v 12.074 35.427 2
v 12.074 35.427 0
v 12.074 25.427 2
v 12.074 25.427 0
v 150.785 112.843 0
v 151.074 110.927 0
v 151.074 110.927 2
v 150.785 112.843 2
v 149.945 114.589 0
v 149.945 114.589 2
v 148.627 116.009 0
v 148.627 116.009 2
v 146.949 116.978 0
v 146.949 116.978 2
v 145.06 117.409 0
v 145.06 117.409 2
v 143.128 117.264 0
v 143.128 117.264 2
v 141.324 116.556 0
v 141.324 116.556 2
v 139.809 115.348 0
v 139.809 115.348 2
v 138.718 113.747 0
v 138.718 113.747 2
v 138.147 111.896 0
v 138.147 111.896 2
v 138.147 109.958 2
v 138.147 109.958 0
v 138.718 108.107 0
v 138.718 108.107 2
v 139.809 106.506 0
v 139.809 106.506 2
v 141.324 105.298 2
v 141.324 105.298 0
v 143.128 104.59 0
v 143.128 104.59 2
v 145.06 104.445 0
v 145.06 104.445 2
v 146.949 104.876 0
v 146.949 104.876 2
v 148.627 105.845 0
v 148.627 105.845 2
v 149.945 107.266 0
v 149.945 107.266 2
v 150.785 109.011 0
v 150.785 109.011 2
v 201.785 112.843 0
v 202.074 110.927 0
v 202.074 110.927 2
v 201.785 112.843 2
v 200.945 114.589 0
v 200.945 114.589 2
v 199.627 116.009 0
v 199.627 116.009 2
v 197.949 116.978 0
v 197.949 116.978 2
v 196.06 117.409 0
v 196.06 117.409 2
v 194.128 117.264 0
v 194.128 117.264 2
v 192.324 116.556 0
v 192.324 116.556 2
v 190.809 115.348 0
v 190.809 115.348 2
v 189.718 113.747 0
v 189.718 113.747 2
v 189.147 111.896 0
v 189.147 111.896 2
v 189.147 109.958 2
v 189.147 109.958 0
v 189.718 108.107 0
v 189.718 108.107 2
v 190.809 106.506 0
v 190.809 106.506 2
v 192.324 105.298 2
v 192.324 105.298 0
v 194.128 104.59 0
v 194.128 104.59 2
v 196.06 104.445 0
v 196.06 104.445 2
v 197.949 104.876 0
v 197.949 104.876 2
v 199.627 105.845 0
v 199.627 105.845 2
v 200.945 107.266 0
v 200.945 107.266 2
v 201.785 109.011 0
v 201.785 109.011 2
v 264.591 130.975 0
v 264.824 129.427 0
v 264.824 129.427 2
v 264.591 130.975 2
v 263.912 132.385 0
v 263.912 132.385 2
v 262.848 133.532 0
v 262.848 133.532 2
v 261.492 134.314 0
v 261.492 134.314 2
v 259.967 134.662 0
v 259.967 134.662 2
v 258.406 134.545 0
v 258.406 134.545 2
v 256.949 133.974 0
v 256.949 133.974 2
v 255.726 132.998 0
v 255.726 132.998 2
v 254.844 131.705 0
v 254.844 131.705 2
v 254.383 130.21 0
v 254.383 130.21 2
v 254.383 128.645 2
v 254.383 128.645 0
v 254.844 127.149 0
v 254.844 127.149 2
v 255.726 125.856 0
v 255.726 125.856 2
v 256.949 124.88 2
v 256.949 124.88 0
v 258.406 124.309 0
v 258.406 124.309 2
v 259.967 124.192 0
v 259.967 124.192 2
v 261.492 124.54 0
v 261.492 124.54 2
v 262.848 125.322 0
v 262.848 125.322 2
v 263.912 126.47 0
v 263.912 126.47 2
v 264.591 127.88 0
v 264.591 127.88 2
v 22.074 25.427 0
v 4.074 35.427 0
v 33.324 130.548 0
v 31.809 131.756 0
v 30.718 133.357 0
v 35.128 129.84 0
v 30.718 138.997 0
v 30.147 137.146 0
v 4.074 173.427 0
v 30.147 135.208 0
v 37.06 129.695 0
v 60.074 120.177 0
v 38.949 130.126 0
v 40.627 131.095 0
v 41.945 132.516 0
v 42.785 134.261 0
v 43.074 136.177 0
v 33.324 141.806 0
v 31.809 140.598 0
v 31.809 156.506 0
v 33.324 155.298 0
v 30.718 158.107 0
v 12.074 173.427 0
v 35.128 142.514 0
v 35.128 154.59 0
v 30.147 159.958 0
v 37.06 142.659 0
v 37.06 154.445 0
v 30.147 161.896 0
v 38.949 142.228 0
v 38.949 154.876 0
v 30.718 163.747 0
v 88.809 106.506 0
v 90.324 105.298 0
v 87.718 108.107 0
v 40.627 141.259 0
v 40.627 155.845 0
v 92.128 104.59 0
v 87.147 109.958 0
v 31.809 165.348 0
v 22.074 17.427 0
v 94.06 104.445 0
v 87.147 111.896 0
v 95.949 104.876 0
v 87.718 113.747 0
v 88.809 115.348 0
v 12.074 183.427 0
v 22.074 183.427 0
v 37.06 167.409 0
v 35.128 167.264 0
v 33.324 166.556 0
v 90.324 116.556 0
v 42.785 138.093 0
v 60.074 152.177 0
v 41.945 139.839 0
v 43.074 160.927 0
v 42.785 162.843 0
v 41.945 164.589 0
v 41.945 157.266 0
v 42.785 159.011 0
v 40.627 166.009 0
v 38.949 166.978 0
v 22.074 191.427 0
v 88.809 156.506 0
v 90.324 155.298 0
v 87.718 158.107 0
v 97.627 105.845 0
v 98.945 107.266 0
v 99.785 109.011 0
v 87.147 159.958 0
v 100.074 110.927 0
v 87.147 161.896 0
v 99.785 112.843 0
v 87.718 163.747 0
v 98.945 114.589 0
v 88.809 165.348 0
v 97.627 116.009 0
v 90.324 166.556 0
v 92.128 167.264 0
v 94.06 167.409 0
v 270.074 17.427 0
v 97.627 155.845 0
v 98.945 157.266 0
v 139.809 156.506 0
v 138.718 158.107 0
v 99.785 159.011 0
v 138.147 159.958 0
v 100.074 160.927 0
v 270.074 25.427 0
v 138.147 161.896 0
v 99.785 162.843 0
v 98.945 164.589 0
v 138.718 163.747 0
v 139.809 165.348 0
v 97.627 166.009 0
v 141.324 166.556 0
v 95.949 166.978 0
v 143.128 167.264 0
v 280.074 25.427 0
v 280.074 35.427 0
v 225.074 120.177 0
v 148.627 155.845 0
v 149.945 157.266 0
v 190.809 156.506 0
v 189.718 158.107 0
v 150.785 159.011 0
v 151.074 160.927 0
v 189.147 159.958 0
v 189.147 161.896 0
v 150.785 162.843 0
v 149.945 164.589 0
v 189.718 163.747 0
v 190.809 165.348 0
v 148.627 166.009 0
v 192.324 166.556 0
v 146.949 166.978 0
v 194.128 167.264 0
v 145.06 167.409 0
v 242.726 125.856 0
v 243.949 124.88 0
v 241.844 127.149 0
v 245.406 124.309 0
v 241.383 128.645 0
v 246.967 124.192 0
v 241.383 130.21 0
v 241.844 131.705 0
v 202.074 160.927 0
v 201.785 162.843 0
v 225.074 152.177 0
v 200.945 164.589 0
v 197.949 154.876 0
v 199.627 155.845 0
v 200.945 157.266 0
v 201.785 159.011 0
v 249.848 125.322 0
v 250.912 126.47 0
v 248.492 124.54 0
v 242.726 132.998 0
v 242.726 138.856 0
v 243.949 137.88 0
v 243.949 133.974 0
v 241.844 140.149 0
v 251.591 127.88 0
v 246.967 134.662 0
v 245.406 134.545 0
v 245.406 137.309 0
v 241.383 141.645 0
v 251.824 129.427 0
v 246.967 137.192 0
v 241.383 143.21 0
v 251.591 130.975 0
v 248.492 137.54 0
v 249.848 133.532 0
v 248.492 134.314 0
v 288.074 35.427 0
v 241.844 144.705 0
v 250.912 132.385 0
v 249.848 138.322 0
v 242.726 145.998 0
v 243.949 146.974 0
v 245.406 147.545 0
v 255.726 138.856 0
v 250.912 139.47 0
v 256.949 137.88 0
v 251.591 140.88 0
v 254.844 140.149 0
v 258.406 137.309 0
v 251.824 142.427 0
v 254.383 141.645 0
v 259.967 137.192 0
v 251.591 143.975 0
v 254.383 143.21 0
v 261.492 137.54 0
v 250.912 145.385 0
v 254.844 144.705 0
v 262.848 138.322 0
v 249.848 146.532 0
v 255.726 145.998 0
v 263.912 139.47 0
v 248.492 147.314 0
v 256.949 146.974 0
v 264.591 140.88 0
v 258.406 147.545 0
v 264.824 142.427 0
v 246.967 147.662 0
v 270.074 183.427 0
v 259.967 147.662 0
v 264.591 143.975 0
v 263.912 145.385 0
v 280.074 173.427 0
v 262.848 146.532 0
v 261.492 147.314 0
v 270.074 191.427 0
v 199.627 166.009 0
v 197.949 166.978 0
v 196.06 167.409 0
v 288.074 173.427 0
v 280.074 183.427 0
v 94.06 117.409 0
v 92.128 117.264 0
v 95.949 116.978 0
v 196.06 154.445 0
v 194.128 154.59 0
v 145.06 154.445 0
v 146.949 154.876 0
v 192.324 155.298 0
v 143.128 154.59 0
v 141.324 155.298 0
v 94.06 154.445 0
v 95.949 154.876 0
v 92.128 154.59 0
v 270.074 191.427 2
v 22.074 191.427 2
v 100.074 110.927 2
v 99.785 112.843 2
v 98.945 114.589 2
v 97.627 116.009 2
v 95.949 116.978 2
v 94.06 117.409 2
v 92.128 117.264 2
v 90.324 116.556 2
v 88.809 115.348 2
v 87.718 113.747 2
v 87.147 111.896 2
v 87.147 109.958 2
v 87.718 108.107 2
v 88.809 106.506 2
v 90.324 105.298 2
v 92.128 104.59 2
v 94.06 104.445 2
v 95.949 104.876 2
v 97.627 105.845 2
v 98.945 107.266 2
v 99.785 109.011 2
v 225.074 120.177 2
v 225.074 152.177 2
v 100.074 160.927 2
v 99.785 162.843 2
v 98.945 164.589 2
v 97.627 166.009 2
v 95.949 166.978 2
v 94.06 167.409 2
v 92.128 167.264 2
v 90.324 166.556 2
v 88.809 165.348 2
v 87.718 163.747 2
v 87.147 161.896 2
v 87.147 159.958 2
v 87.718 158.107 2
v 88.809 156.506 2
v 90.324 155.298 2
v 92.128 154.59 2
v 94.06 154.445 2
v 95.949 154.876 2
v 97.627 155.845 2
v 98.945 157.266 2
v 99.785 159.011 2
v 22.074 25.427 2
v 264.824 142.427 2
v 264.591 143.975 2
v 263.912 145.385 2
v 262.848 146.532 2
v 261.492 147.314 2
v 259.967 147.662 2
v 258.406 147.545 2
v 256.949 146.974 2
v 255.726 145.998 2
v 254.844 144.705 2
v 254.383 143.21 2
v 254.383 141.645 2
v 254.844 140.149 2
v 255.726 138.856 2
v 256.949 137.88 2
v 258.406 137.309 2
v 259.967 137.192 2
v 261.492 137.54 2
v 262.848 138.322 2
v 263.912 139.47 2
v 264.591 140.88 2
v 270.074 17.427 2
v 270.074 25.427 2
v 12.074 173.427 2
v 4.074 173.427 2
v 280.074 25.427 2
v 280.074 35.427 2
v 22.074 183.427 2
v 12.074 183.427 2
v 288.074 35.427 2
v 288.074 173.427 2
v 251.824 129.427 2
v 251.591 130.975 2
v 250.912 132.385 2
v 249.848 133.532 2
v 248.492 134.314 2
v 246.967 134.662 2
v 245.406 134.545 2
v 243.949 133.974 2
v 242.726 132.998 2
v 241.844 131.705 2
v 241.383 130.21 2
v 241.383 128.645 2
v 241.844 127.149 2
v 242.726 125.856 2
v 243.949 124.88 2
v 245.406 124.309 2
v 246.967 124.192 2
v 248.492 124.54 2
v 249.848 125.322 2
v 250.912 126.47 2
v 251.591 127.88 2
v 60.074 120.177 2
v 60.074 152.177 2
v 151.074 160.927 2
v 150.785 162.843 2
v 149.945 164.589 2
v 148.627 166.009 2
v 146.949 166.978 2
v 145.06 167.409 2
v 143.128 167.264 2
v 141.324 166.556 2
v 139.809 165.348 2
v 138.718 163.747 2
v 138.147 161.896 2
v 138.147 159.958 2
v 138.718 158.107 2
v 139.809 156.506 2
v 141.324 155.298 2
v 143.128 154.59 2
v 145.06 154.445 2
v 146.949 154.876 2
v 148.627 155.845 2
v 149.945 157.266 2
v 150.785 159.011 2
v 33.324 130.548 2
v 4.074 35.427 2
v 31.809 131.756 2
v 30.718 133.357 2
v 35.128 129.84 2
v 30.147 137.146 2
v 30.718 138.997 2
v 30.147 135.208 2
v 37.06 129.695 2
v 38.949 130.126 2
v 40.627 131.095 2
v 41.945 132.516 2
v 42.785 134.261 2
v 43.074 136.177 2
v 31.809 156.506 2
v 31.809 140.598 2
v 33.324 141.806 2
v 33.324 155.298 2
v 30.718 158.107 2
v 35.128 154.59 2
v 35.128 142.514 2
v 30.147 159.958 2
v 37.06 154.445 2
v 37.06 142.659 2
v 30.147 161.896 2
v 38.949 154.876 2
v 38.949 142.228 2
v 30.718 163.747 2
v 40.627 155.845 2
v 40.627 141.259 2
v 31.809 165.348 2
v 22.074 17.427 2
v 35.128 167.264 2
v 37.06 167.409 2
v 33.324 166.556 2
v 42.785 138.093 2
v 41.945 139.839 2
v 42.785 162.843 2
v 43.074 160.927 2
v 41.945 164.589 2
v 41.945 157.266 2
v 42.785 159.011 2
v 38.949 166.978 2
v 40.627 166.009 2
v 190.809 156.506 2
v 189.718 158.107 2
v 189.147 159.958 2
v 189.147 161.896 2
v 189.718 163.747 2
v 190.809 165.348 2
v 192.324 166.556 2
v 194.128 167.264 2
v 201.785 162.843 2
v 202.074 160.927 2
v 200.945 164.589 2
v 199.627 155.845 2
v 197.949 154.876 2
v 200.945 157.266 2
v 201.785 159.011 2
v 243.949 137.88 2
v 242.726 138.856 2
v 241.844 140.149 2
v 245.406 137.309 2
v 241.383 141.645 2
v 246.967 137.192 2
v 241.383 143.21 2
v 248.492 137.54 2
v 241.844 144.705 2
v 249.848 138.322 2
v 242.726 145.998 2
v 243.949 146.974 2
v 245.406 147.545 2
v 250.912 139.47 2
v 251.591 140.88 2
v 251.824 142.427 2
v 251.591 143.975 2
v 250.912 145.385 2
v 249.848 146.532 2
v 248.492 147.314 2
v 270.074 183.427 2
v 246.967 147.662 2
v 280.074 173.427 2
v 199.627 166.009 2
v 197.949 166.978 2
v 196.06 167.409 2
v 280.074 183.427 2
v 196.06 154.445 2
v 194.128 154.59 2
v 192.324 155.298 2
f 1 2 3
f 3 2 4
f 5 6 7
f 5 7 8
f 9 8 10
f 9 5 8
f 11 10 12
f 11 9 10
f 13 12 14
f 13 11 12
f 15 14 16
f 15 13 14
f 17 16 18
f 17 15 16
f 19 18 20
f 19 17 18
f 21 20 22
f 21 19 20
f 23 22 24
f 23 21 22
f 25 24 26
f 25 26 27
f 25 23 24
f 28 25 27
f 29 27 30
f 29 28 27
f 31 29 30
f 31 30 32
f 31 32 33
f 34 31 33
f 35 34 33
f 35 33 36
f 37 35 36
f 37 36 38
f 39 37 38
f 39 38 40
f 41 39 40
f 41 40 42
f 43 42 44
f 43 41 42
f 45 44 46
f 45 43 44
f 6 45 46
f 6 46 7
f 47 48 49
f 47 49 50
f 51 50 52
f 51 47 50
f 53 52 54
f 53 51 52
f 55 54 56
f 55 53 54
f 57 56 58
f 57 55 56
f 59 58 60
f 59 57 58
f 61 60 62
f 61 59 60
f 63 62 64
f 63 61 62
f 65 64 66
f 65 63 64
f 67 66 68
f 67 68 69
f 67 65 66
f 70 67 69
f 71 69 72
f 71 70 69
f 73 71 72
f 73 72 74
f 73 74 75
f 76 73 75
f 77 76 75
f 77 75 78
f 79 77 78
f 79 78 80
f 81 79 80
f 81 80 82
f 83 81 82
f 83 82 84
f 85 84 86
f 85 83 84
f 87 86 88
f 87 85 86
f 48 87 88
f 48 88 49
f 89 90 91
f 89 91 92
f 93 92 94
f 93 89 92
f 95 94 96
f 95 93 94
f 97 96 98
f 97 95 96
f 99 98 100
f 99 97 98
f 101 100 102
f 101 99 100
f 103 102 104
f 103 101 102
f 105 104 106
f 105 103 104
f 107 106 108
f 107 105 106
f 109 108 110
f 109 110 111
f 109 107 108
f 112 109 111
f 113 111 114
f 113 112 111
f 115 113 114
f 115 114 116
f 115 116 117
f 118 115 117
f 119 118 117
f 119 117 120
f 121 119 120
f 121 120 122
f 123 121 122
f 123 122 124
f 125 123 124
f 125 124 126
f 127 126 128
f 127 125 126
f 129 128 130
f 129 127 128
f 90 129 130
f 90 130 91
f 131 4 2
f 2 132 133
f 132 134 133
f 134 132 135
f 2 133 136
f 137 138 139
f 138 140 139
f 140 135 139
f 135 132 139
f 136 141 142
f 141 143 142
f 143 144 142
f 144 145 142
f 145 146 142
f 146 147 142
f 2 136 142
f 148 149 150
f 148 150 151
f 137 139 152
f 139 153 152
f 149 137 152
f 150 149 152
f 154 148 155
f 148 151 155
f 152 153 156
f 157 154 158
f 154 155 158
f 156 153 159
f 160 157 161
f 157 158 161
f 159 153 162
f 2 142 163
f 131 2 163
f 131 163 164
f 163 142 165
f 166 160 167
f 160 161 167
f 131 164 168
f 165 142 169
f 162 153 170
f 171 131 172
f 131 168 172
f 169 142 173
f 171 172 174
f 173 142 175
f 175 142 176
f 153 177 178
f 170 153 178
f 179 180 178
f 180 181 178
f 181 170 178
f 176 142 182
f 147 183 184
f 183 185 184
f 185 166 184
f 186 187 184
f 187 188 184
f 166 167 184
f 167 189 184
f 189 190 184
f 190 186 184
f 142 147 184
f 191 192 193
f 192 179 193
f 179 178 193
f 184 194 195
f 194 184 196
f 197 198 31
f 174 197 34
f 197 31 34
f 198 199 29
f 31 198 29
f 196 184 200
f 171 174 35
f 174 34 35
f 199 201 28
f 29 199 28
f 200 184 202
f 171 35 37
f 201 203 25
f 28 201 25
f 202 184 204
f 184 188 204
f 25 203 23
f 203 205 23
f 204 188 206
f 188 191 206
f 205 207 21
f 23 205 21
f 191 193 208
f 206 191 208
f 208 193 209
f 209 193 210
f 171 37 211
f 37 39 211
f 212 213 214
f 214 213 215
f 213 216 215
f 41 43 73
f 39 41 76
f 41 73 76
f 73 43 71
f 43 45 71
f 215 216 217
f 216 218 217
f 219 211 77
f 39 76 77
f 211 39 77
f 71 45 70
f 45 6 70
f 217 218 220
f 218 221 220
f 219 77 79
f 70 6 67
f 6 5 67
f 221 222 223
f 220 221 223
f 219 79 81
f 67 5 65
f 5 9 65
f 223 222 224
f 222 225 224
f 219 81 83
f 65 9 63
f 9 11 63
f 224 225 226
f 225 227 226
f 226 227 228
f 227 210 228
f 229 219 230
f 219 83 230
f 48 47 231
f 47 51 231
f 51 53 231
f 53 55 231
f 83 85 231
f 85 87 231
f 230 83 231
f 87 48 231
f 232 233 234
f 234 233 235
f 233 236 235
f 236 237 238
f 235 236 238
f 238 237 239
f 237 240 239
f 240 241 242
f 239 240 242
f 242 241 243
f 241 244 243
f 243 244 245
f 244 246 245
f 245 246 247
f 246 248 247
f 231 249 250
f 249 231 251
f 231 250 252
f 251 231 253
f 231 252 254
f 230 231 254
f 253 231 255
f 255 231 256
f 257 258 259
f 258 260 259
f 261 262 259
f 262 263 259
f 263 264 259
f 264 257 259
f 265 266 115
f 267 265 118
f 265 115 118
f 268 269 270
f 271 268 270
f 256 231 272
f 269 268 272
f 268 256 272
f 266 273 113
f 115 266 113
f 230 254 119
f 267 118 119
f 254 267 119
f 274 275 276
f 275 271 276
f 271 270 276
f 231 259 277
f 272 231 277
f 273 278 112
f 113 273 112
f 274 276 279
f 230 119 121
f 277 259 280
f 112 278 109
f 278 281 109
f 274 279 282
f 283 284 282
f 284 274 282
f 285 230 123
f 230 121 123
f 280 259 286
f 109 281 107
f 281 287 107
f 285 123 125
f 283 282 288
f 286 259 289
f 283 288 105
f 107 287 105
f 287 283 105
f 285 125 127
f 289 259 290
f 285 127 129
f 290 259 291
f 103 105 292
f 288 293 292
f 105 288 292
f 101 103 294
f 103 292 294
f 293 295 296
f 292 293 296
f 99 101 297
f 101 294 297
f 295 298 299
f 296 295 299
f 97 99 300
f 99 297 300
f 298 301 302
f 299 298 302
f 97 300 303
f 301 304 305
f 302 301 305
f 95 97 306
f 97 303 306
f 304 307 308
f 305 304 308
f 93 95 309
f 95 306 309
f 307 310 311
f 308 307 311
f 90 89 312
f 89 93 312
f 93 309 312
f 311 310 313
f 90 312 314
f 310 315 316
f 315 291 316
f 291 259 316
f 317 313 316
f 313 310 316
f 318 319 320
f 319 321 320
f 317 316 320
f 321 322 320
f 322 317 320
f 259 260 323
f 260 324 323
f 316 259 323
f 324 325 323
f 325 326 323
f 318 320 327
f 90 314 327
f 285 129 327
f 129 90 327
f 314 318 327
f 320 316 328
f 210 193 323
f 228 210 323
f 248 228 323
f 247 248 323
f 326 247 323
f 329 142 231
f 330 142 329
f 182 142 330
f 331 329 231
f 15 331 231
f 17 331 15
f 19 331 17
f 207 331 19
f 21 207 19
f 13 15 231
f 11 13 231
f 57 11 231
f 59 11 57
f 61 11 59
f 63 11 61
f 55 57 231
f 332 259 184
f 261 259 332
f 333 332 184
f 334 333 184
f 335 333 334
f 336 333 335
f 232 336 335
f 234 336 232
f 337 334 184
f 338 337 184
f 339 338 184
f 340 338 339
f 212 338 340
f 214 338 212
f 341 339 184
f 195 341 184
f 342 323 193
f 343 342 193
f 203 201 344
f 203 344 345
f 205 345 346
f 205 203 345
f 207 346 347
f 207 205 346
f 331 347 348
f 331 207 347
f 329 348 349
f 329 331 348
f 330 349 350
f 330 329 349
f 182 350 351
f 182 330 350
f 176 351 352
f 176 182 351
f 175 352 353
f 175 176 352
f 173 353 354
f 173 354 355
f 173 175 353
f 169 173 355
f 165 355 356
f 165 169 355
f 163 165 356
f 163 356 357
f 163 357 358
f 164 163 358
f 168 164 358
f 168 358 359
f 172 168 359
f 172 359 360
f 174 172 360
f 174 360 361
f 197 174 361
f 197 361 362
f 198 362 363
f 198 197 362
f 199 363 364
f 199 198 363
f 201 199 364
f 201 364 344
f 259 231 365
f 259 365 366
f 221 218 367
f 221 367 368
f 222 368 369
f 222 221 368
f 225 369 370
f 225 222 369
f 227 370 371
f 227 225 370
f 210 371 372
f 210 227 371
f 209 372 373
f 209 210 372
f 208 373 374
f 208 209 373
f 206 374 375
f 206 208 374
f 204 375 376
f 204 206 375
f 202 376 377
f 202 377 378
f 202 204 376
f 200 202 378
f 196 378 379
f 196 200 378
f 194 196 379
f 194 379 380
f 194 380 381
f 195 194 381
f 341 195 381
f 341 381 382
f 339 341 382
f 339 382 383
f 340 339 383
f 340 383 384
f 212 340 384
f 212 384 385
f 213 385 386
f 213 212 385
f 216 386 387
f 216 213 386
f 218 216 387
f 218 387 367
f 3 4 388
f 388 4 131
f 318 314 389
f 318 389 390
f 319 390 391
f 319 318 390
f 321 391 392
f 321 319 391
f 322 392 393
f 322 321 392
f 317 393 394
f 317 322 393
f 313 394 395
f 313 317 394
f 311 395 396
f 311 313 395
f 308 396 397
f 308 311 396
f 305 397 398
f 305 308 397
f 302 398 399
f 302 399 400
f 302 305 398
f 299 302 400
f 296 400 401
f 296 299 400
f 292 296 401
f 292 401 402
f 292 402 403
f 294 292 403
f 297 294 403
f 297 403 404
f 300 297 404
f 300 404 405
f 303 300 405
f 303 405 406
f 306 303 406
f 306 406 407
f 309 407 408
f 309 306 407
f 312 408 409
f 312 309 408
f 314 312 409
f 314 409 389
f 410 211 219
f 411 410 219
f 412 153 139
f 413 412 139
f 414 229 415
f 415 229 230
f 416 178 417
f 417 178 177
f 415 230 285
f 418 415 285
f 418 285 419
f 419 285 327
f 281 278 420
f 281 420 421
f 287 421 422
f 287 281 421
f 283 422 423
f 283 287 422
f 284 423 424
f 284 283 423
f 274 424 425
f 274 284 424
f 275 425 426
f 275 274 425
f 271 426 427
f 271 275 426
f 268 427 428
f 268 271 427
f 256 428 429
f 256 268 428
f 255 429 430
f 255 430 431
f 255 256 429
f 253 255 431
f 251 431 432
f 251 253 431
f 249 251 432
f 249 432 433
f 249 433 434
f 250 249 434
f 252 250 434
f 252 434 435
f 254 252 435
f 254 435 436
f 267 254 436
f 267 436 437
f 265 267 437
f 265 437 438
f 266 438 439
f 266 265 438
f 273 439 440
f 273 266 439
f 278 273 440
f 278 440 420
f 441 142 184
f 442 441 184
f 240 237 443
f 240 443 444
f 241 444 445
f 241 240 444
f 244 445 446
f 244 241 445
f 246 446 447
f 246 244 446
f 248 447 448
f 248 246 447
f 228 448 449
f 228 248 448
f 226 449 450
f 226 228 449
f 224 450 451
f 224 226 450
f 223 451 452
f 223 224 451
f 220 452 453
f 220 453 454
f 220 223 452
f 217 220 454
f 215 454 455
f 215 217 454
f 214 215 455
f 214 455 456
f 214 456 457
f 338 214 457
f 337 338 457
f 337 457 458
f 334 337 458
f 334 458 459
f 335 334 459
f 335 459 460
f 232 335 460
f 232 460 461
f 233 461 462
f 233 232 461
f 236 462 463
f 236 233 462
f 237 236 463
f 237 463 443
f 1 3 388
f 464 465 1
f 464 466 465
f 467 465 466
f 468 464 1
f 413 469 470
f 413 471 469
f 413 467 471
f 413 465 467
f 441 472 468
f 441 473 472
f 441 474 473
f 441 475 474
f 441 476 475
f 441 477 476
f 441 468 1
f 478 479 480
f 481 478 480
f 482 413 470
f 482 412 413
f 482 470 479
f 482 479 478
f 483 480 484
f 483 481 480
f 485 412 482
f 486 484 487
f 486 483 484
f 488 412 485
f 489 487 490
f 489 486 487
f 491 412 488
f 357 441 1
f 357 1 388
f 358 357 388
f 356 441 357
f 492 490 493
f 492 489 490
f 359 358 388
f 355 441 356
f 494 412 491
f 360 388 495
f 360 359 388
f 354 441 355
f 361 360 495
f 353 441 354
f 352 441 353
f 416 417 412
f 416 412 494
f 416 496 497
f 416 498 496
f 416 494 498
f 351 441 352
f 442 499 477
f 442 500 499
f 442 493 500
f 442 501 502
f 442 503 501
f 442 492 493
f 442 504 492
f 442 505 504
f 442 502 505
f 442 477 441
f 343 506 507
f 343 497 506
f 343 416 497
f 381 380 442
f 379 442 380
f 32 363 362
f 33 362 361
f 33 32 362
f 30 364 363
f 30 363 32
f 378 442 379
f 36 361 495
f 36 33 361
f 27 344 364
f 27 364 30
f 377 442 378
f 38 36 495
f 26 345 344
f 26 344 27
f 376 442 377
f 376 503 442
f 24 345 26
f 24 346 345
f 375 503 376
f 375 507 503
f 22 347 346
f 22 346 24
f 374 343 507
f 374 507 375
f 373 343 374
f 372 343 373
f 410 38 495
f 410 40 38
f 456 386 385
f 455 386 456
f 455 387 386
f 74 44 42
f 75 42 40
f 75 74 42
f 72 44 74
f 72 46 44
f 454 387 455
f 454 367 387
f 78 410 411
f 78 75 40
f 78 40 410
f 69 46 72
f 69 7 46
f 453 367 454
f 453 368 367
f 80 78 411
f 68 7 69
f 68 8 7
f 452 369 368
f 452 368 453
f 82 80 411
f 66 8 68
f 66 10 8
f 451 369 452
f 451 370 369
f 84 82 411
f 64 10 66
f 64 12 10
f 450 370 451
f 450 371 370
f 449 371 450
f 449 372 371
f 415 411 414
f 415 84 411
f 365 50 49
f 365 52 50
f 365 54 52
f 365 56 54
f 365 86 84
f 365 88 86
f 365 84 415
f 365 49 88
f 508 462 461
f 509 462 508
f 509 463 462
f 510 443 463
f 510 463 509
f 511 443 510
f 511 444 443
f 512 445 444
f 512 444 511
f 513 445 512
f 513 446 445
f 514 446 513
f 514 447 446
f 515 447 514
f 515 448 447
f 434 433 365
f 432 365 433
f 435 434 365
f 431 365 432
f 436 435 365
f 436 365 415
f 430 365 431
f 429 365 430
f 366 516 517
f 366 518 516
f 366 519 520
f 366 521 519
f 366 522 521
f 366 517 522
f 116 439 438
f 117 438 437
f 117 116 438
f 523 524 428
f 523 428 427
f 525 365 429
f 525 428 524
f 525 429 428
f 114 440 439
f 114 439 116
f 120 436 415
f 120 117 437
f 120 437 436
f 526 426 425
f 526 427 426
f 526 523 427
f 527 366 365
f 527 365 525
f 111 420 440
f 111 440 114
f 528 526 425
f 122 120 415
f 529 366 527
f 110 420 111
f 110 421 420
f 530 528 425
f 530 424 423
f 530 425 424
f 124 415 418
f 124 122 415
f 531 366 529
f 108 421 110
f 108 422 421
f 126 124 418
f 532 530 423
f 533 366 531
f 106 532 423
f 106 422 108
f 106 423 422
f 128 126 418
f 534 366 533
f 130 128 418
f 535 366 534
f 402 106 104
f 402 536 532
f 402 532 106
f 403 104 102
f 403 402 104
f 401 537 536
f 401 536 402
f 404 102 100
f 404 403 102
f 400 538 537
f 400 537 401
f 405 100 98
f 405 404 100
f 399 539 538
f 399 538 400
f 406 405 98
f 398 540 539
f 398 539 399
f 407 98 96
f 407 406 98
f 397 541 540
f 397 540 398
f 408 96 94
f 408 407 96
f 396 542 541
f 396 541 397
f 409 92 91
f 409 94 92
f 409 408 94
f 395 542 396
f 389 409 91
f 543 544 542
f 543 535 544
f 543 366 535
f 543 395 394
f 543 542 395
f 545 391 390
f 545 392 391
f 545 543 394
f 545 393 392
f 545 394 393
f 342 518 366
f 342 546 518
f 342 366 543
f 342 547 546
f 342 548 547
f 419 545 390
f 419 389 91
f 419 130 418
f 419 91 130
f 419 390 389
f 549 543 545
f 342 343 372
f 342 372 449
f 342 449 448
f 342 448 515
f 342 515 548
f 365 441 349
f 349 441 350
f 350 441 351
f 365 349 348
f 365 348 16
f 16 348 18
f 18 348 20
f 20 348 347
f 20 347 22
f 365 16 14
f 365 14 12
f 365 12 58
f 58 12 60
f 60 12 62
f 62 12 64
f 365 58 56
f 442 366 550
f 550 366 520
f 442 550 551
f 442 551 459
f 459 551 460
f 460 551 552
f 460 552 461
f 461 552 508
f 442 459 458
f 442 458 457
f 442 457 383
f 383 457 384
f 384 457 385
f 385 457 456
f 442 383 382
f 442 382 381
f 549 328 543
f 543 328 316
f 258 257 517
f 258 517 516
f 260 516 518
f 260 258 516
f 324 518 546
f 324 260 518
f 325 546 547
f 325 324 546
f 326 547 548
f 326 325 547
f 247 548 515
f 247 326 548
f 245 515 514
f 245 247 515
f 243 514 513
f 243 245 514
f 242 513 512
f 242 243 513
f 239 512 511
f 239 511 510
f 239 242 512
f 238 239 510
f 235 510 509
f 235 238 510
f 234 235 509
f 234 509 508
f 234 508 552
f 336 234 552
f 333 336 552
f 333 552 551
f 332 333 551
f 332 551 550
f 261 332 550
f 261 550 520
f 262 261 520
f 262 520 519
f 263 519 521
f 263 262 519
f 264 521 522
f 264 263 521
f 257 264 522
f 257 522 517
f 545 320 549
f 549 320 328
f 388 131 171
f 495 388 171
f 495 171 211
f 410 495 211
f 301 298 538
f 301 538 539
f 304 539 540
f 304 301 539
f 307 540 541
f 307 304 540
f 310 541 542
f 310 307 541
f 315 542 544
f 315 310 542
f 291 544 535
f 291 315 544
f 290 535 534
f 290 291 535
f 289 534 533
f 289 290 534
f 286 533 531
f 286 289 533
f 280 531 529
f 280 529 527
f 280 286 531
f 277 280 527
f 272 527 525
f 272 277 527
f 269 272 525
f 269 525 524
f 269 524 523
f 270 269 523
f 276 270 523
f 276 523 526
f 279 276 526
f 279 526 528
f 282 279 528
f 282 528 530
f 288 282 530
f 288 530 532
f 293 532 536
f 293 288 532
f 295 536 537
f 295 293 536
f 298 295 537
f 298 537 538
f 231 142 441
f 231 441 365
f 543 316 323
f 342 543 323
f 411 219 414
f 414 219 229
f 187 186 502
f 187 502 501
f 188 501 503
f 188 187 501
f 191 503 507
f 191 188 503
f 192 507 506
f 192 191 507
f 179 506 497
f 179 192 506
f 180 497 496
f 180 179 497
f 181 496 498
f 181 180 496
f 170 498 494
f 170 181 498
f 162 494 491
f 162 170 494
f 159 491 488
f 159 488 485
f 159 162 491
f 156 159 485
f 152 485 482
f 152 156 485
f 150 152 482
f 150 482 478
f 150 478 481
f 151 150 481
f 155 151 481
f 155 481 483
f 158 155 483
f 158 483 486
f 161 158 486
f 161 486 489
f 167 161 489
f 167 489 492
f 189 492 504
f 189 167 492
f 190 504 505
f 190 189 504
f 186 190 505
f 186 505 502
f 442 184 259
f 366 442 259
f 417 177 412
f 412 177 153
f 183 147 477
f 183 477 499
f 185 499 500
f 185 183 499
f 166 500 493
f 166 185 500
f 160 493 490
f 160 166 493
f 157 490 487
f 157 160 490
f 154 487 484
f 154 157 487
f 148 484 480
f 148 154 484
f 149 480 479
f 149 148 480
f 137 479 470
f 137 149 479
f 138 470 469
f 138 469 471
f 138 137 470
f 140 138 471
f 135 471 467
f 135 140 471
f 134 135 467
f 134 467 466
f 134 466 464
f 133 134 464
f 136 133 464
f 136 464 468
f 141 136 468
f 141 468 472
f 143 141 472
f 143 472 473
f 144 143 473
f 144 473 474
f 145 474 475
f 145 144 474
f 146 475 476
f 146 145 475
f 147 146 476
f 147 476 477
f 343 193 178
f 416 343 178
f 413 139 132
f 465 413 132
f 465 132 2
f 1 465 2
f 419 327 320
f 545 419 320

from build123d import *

# Parameters (mm, degrees)
MODEL_R                  = 6.5
MODEL_R_2                = 5.25
MODEL_W                  = 165
MODEL_H                  = 32
RESSALTO_EXTRUS_O1_DEPTH = 2


with BuildPart() as part:
    # Model → Ressalto-extrusão1 (new body)
    with BuildSketch(Plane.XY):
        Polygon((270.074227849, 25.427113901), (280.074227849, 25.427113901), (280.074227849, 35.427113901), (288.074227849, 35.427113901), (288.074227849, 173.427113901), (280.074227849, 173.427113901), (280.074227849, 183.427113901), (270.074227849, 183.427113901), (270.074227849, 191.427113901), (22.074227849, 191.427113901), (22.074227849, 183.427113901), (12.074227849, 183.427113901), (12.074227849, 173.427113901), (4.074227849, 173.427113901), (4.074227849, 35.427113901), (12.074227849, 35.427113901), (12.074227849, 25.427113901), (22.074227849, 25.427113901), (22.074227849, 17.427113901), (270.074227849, 17.427113901), align=None)
        with Locations((36.574227849, 160.927113901)):
            Circle(MODEL_R, mode=Mode.SUBTRACT)
        with Locations((36.574227849, 136.177113901)):
            Circle(MODEL_R, mode=Mode.SUBTRACT)
        with Locations((93.574227849, 110.927113901)):
            Circle(MODEL_R, mode=Mode.SUBTRACT)
        with Locations((144.574227849, 110.927113901)):
            Circle(MODEL_R, mode=Mode.SUBTRACT)
        with Locations((195.574227849, 110.927113901)):
            Circle(MODEL_R, mode=Mode.SUBTRACT)
        with Locations((195.574227849, 160.927113901)):
            Circle(MODEL_R, mode=Mode.SUBTRACT)
        with Locations((144.574227849, 160.927113901)):
            Circle(MODEL_R, mode=Mode.SUBTRACT)
        with Locations((93.574227849, 160.927113901)):
            Circle(MODEL_R, mode=Mode.SUBTRACT)
        with Locations((246.574227849, 142.427113901)):
            Circle(MODEL_R_2, mode=Mode.SUBTRACT)
        with Locations((259.574227849, 142.427113901)):
            Circle(MODEL_R_2, mode=Mode.SUBTRACT)
        with Locations((259.574227849, 129.427113901)):
            Circle(MODEL_R_2, mode=Mode.SUBTRACT)
        with Locations((246.574227849, 129.427113901)):
            Circle(MODEL_R_2, mode=Mode.SUBTRACT)
        with Locations((142.574227849, 136.177113901)):
            Rectangle(MODEL_W, MODEL_H, mode=Mode.SUBTRACT)
    extrude(amount=RESSALTO_EXTRUS_O1_DEPTH)


solid = part.part
